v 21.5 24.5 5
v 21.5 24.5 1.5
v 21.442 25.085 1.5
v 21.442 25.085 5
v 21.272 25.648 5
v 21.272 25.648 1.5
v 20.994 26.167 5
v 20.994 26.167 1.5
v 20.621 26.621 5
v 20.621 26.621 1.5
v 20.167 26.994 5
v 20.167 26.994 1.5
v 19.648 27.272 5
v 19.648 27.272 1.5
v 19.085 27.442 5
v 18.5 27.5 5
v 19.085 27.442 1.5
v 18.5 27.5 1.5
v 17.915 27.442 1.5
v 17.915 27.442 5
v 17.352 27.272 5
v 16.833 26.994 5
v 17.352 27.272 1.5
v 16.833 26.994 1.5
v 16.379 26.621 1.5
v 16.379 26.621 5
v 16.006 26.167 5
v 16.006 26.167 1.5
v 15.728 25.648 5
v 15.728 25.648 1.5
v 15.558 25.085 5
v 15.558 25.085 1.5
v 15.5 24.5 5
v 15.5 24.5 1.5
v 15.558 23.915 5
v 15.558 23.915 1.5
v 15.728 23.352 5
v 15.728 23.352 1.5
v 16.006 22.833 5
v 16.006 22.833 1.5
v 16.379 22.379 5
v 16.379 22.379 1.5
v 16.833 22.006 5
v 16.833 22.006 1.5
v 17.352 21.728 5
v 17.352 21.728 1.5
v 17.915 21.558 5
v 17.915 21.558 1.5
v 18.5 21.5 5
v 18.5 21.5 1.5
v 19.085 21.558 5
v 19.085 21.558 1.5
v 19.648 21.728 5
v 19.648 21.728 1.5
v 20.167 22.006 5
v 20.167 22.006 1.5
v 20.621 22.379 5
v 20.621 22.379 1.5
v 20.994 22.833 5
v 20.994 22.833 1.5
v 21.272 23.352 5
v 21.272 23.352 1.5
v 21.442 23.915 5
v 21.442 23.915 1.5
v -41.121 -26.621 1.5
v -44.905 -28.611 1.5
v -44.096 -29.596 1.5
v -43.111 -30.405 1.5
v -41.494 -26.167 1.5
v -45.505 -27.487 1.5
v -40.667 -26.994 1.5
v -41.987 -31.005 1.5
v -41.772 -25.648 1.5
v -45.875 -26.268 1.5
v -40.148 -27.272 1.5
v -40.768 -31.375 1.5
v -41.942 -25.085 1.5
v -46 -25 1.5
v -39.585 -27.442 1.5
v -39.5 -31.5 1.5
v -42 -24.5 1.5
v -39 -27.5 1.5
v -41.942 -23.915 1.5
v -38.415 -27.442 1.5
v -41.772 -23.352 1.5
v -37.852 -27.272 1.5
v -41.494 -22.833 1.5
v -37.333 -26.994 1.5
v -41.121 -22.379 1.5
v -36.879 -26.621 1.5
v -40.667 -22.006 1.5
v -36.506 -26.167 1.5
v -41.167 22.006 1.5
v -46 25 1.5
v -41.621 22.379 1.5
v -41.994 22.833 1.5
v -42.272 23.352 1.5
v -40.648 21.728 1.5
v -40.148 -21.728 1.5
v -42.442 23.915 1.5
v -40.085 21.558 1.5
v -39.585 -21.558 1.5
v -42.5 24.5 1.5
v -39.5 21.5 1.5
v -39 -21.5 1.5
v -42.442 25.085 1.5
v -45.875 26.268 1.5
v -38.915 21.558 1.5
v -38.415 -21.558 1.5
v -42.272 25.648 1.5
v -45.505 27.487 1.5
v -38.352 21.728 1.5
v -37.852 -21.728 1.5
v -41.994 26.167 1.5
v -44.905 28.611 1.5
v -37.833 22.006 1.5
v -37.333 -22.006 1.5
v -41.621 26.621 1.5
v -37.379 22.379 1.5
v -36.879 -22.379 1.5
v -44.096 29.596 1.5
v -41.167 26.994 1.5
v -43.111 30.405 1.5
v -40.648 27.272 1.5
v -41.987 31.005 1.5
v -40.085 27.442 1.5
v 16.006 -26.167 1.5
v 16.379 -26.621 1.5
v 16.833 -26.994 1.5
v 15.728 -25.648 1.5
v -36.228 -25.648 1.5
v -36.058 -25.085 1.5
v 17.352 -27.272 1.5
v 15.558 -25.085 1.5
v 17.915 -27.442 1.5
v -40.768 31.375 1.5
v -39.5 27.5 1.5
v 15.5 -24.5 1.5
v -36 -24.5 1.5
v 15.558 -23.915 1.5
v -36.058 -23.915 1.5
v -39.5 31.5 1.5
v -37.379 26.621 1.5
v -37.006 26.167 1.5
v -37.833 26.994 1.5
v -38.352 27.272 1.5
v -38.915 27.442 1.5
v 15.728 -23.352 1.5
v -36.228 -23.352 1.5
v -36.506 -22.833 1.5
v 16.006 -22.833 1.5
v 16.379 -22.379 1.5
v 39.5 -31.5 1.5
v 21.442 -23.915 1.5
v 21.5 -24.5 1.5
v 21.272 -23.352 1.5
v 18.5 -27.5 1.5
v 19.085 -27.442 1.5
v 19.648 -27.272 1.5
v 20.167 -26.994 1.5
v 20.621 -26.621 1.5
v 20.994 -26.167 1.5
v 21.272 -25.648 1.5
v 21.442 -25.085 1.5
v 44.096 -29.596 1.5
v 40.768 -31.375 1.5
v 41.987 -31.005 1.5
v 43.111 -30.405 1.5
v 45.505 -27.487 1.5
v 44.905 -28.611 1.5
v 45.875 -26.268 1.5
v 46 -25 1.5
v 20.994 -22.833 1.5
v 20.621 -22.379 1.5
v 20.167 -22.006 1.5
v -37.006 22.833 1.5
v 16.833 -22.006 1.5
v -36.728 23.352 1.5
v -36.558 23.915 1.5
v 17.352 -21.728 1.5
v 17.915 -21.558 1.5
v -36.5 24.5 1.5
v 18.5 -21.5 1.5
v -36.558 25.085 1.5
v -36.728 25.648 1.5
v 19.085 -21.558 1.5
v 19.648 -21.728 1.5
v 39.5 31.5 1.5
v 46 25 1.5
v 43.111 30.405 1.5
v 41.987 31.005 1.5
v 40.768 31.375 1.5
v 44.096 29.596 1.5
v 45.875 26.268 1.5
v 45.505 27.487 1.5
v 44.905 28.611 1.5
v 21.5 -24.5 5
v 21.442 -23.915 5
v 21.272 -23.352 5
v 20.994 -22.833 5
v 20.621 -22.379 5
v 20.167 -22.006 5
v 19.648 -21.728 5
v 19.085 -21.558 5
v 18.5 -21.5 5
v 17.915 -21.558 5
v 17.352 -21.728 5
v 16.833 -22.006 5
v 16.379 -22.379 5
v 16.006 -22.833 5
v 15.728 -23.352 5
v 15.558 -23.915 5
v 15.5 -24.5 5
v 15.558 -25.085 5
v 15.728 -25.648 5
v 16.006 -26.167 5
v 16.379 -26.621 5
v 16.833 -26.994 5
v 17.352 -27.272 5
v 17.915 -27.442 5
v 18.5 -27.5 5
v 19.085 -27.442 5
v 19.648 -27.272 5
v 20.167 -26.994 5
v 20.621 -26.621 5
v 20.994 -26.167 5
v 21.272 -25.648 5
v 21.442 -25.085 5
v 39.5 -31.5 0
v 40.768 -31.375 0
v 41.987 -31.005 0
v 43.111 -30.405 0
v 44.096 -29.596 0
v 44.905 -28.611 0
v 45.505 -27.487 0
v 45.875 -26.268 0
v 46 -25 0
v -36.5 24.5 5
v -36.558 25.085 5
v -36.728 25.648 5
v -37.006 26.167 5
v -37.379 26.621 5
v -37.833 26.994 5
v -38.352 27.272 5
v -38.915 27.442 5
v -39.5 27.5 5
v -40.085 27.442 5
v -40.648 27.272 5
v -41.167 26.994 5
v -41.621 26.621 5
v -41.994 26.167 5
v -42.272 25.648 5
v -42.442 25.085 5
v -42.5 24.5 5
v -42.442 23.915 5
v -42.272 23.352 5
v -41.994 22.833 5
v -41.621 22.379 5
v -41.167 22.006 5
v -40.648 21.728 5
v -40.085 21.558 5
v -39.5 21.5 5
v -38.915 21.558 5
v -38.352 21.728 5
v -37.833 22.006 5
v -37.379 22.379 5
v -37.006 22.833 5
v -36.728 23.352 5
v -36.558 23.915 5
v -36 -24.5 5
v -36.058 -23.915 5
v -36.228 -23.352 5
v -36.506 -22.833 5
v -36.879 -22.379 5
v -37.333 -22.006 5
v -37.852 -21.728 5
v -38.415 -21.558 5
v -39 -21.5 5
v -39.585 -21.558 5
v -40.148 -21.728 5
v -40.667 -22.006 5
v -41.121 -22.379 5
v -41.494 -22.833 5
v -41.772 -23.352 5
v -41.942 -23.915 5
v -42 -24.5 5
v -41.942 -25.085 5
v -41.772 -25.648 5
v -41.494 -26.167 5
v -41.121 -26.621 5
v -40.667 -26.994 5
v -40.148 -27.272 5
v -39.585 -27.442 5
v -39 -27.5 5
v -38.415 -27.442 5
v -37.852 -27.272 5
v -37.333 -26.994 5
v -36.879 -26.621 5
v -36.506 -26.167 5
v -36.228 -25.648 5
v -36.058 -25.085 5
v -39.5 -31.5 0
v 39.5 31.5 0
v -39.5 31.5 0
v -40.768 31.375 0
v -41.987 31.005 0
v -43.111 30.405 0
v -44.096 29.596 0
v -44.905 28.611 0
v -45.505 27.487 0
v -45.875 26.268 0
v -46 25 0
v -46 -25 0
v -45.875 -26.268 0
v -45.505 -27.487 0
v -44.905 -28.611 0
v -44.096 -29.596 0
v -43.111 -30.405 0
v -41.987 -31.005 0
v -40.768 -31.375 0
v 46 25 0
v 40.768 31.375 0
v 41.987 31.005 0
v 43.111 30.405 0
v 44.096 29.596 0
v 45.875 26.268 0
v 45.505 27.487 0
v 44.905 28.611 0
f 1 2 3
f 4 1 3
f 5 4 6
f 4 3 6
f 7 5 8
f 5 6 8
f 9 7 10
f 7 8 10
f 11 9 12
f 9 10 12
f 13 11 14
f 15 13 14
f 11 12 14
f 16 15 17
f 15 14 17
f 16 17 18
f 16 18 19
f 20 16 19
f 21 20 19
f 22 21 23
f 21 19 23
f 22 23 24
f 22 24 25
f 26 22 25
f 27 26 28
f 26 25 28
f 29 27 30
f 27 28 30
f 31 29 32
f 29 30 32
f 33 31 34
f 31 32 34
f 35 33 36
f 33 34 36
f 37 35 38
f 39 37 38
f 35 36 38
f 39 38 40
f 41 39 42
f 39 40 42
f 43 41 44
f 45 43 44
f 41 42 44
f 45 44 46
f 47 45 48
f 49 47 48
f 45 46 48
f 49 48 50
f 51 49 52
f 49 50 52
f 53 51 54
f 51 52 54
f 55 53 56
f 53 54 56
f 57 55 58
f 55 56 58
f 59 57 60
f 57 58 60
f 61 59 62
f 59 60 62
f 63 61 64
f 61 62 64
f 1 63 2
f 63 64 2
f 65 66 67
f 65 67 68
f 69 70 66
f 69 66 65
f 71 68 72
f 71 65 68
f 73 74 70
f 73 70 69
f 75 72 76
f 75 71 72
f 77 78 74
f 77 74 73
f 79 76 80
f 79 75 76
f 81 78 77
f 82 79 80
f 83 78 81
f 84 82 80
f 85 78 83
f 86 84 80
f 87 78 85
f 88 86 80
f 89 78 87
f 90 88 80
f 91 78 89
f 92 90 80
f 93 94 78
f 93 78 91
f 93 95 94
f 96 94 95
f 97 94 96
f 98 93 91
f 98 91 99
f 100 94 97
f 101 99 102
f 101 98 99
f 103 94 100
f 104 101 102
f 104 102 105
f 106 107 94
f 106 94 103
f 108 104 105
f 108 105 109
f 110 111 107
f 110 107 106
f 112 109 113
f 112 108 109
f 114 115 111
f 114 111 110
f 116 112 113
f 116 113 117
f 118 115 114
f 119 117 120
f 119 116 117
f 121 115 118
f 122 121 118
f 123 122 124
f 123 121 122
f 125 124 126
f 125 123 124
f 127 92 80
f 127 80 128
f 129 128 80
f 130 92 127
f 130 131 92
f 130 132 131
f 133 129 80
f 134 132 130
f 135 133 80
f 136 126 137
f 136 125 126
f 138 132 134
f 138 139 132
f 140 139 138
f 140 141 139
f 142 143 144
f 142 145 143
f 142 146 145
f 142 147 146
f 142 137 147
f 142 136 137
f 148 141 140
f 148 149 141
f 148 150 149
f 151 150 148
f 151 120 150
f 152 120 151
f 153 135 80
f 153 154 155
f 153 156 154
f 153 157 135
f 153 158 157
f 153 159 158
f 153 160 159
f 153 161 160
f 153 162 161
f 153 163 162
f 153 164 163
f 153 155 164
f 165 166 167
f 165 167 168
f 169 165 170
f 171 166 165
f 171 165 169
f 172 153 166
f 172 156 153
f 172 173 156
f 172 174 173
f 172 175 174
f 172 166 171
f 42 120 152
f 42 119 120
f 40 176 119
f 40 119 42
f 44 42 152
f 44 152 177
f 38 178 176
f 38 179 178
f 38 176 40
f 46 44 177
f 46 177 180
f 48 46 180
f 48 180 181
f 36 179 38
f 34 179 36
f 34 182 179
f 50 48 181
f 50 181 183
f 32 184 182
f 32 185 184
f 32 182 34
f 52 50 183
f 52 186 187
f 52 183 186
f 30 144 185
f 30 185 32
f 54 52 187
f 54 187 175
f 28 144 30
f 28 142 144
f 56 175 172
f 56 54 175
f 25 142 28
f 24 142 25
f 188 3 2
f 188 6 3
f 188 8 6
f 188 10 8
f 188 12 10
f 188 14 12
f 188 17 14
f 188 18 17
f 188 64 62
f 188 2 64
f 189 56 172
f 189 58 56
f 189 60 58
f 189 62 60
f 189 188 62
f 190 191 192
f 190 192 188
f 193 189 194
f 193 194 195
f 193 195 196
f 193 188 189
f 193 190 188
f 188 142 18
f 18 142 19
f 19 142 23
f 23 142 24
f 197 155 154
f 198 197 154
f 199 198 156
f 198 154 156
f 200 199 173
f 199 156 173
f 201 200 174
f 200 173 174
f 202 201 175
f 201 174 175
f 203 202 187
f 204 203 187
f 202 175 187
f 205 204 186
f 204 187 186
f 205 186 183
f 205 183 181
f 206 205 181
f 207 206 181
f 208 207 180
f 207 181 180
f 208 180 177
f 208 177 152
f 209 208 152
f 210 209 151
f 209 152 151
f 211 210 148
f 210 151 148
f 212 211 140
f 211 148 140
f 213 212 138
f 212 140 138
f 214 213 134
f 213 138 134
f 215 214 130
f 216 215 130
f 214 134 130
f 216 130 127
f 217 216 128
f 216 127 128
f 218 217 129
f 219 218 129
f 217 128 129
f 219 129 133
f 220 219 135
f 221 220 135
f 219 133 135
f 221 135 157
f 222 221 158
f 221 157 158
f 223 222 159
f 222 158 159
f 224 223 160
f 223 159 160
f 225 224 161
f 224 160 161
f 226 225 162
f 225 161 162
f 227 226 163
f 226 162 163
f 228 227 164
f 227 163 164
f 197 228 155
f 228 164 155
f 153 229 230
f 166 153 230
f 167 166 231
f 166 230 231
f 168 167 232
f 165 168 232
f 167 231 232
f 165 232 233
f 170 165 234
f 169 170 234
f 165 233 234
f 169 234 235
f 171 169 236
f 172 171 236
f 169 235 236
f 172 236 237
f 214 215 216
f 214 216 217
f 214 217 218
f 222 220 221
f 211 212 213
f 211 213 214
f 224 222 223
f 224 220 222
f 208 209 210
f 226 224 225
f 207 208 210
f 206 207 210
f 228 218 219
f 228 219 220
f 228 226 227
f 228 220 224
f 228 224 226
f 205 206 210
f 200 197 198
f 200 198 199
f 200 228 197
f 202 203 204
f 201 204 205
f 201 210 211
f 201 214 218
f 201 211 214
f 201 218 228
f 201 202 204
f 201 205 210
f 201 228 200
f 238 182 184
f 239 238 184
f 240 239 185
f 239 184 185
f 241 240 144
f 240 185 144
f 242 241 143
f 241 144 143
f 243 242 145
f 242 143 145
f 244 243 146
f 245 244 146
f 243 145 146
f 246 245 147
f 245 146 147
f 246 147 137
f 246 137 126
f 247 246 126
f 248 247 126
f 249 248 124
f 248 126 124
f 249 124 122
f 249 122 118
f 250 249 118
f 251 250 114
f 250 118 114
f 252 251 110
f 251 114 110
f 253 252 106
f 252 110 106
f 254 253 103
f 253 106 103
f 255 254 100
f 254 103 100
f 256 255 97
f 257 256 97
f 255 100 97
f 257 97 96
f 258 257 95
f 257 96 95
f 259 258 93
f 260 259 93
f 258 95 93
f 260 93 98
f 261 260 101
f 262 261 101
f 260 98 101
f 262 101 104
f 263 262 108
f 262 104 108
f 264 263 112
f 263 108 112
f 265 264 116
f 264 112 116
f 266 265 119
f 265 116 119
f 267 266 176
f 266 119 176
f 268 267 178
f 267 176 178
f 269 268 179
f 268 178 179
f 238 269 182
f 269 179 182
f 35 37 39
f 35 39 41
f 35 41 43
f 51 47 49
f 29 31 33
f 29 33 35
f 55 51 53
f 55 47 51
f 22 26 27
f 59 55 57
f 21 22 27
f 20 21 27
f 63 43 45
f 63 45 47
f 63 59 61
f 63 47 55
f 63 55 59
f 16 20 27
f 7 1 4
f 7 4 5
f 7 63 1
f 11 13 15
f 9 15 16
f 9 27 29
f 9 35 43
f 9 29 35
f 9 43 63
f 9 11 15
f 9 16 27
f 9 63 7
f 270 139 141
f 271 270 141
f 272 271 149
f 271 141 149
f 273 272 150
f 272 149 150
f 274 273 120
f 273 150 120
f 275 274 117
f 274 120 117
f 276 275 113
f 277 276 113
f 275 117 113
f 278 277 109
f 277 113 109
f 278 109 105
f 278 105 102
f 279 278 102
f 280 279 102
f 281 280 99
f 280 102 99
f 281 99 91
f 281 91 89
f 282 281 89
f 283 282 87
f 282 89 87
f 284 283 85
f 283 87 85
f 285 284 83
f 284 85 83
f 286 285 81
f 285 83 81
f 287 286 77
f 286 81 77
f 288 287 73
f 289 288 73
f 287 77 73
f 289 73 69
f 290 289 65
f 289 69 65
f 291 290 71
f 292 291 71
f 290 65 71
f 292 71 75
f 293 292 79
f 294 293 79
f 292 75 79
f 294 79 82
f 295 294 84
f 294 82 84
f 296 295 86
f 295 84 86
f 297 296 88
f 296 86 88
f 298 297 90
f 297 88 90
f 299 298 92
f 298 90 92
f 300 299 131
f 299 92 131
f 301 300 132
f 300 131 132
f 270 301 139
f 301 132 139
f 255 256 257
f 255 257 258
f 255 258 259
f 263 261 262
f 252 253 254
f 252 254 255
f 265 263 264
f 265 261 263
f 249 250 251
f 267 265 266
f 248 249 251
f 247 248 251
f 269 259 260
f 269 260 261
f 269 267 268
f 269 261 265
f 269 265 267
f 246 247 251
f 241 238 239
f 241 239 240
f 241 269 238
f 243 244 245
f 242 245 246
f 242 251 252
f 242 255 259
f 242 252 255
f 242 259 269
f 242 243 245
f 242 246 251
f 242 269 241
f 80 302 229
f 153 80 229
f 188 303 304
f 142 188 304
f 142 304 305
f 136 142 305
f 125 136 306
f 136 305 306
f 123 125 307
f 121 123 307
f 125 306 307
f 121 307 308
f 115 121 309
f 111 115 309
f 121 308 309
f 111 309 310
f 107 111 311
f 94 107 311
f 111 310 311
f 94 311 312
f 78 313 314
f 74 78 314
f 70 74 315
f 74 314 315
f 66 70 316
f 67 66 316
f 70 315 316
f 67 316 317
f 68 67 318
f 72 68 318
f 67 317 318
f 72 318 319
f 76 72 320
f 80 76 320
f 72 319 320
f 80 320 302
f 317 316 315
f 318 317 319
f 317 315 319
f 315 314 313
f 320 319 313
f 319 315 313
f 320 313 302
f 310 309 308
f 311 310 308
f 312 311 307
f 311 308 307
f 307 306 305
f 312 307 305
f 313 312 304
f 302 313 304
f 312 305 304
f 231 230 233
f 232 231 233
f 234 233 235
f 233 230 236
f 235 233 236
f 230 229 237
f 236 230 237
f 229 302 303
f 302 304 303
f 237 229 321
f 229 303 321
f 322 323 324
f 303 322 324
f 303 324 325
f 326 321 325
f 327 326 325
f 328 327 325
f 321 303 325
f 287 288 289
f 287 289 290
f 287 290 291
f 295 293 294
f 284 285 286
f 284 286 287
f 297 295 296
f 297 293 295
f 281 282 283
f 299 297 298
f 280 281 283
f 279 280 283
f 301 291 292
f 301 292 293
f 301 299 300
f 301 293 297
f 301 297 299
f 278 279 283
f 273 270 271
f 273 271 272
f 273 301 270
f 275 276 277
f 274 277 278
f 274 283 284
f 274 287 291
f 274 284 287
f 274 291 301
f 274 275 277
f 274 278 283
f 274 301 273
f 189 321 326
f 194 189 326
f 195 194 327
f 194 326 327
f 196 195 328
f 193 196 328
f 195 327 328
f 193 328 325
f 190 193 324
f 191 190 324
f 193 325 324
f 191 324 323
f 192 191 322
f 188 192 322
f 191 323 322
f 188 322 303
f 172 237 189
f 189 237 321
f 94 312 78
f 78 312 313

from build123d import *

# Parameters (mm, degrees)
F2_DEPTH = 1.5
F3_R     = 3
F5_DEPTH = 3.5


with BuildPart() as f2:
    # F1 (on Top) → F2 (new body)
    with BuildSketch(Plane.XY):
        with BuildLine():
            Line((39.5, 31.5), (-39.5, 31.5))
            ThreePointArc((-39.5, 31.5), (-44.0961940777, 29.5961940777), (-46, 25))
            Line((-46, 25), (-46, -25))
            ThreePointArc((-46, -25), (-44.0961940777, -29.5961940777), (-39.5, -31.5))
            Line((-39.5, -31.5), (39.5, -31.5))
            ThreePointArc((39.5, -31.5), (44.0961940777, -29.5961940777), (46, -25))
            Line((46, -25), (46, 25))
            ThreePointArc((46, 25), (44.0961940777, 29.5961940777), (39.5, 31.5))
        make_face()
    extrude(amount=F2_DEPTH)

    # F3 (on face) → F5 (join, through all)
    with BuildSketch(Plane.XY.offset(1.5)):
        with Locations((-39.5, 24.5)):
            Circle(F3_R)
        with Locations((18.5, 24.5)):
            Circle(F3_R)
        with Locations((-39, -24.5)):
            Circle(F3_R)
        with Locations((18.5, -24.5)):
            Circle(F3_R)
    extrude(amount=F5_DEPTH)


solid = f2.part
